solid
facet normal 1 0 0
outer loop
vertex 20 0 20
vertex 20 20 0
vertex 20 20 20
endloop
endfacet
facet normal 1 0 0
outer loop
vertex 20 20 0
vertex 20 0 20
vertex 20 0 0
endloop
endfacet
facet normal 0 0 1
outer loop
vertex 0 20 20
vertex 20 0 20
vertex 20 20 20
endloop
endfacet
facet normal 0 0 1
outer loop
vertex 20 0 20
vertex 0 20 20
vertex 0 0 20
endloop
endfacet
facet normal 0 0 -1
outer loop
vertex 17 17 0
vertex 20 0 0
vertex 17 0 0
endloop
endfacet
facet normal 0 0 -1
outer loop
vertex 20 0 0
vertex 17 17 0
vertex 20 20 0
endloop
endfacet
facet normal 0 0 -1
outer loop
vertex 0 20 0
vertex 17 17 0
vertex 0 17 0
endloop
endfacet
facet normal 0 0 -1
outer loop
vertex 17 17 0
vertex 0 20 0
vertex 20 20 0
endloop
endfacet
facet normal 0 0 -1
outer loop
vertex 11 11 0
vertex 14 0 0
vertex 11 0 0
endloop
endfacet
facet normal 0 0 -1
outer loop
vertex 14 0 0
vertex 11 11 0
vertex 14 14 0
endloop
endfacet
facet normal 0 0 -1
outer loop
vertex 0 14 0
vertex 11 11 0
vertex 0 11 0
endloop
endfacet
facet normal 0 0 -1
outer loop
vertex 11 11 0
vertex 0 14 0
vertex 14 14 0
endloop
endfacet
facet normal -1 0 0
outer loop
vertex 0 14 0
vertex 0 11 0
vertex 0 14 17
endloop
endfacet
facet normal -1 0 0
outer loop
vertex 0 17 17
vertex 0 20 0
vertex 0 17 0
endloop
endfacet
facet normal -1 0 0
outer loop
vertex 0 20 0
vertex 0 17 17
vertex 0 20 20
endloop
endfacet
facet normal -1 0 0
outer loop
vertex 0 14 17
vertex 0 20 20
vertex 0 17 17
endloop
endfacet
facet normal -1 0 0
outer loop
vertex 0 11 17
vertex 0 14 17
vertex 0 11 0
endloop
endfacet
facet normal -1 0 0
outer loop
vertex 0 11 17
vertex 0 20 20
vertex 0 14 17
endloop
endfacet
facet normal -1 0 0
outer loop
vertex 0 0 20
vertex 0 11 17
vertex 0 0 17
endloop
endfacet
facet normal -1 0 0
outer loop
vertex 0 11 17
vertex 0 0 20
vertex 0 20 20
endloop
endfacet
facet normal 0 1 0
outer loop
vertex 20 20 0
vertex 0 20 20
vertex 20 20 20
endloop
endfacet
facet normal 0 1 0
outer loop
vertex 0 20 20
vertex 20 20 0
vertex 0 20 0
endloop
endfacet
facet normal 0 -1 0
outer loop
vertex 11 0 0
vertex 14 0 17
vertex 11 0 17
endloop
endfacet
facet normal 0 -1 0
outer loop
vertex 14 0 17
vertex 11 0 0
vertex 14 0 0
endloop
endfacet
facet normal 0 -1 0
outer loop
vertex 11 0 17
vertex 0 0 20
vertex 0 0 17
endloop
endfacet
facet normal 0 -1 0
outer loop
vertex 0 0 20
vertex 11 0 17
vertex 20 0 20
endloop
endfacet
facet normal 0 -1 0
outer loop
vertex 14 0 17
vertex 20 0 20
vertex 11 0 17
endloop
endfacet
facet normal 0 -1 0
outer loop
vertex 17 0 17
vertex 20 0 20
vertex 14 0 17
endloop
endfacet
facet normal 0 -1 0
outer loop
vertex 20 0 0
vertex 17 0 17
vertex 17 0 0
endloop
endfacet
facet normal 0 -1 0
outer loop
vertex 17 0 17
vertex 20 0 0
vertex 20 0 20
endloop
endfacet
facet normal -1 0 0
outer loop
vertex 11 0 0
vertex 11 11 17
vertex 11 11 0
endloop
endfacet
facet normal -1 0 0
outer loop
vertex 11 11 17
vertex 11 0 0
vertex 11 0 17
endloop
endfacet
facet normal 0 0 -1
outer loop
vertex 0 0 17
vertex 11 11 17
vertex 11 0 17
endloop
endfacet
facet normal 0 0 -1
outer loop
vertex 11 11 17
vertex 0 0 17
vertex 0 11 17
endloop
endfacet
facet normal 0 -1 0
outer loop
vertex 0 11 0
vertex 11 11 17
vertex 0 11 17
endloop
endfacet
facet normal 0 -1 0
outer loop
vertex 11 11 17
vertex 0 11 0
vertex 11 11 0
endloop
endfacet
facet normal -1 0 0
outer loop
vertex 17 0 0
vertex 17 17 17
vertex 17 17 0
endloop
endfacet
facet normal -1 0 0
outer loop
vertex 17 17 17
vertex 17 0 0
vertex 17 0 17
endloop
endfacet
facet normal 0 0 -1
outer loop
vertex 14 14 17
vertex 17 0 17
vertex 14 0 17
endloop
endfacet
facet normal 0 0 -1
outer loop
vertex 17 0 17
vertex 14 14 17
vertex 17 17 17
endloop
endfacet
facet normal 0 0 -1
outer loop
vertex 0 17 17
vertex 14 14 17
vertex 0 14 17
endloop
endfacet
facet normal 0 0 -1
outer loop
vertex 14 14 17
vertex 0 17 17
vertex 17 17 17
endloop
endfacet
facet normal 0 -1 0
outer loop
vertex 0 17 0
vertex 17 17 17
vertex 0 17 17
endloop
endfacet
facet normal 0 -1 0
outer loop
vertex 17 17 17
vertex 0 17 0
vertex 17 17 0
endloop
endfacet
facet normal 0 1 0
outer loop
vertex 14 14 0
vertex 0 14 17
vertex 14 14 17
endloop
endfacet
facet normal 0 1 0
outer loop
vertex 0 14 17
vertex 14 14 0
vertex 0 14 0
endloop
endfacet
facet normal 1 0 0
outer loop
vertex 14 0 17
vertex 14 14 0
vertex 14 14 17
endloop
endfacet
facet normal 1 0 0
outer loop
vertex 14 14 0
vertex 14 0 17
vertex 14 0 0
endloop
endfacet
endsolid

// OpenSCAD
/* [Global] */

// Which one would you like to see?
part = "first"; // [first:Two Walls,second:Three Walls]

/* [Walls Joint] */
// Enter the Wall Thickness
Wall_Thickness = 3 ;
// Enter the Acrylic Thickness
Acrylic_Thickness = 3 ;
// Enter the Cube Size - Minimum:(Acrylic Thickness + (Wall Thickness * 4) + 5)
Cube_Size = 20;


print_part();

module print_part() {
	if (part == "first") {
		Two_Walls();
	} else if (part == "second") {
		Three_Walls();
	}
}


module Three_Walls() {
group() {  group(){
	difference() {
	difference() {
	difference() {
	difference() {
	cube (size = Cube_Size, center = false);
	cube (size = [Cube_Size-(Acrylic_Thickness+Wall_Thickness*2), Cube_Size-(Acrylic_Thickness+Wall_Thickness*2), Cube_Size-Wall_Thickness*2-Acrylic_Thickness], center = false);
	}
	multmatrix([[1.0, 0.0, 0.0,0.0], [0.0, 1.0, 0.0, Cube_Size-Wall_Thickness-Acrylic_Thickness], [0.0, 0.0, 1.0, 0.0], [0, 0, 0, 1]]){
	cube (size = [Cube_Size-Wall_Thickness, Acrylic_Thickness, Cube_Size-Wall_Thickness], center = false);
	} 
	}
	multmatrix([[1.0, 0.0, 0.0,Cube_Size-Wall_Thickness-Acrylic_Thickness], [0.0, 1.0, 0.0, 0.0], [0.0, 0.0, 1.0, 0.0], [0, 0, 0, 1]]){
	cube (size = [Acrylic_Thickness, Cube_Size-Wall_Thickness, Cube_Size-Wall_Thickness], center = false);
	}
	}
	multmatrix([[1.0, 0.0, 0.0,0.0], [0.0, 1.0, 0.0, 0.0], [0.0, 0.0, 1.0, Cube_Size-Wall_Thickness-Acrylic_Thickness], [             0, 0, 0, 1]]){
	cube (size = [Cube_Size-Wall_Thickness*2-Acrylic_Thickness, Cube_Size-Wall_Thickness*2-Acrylic_Thickness, Acrylic_Thickness], center = false);
	}
	}
	}
	}
}
	
module Two_Walls() {	
group() {
	group(){
	difference() {
	difference() {
	difference() {
	cube (size = Cube_Size, center = false);
	cube (size = [Cube_Size- (Acrylic_Thickness+Wall_Thickness*2), Cube_Size- (Acrylic_Thickness+Wall_Thickness*2), Cube_Size-Wall_Thickness], center = false);
	}
	multmatrix([[1.0, 0.0, 0.0,0.0], [0.0, 1.0, 0.0, Cube_Size-Wall_Thickness-Acrylic_Thickness], [0.0, 0.0, 1.0, 0.0], [0, 0, 0, 1]]){
	cube (size = [Cube_Size-Wall_Thickness, Acrylic_Thickness, Cube_Size-Wall_Thickness], center = false);
	}
	}
	multmatrix([[1.0, 0.0, 0.0,Cube_Size-Wall_Thickness-Acrylic_Thickness], [0.0, 1.0, 0.0, 0.0], [0.0, 0.0, 1.0, 0.0], [0, 0, 0, 1]]){
	cube (size = [Acrylic_Thickness, Cube_Size-Wall_Thickness, Cube_Size-Wall_Thickness], center = false);
	}
	}
	}
	}
}
